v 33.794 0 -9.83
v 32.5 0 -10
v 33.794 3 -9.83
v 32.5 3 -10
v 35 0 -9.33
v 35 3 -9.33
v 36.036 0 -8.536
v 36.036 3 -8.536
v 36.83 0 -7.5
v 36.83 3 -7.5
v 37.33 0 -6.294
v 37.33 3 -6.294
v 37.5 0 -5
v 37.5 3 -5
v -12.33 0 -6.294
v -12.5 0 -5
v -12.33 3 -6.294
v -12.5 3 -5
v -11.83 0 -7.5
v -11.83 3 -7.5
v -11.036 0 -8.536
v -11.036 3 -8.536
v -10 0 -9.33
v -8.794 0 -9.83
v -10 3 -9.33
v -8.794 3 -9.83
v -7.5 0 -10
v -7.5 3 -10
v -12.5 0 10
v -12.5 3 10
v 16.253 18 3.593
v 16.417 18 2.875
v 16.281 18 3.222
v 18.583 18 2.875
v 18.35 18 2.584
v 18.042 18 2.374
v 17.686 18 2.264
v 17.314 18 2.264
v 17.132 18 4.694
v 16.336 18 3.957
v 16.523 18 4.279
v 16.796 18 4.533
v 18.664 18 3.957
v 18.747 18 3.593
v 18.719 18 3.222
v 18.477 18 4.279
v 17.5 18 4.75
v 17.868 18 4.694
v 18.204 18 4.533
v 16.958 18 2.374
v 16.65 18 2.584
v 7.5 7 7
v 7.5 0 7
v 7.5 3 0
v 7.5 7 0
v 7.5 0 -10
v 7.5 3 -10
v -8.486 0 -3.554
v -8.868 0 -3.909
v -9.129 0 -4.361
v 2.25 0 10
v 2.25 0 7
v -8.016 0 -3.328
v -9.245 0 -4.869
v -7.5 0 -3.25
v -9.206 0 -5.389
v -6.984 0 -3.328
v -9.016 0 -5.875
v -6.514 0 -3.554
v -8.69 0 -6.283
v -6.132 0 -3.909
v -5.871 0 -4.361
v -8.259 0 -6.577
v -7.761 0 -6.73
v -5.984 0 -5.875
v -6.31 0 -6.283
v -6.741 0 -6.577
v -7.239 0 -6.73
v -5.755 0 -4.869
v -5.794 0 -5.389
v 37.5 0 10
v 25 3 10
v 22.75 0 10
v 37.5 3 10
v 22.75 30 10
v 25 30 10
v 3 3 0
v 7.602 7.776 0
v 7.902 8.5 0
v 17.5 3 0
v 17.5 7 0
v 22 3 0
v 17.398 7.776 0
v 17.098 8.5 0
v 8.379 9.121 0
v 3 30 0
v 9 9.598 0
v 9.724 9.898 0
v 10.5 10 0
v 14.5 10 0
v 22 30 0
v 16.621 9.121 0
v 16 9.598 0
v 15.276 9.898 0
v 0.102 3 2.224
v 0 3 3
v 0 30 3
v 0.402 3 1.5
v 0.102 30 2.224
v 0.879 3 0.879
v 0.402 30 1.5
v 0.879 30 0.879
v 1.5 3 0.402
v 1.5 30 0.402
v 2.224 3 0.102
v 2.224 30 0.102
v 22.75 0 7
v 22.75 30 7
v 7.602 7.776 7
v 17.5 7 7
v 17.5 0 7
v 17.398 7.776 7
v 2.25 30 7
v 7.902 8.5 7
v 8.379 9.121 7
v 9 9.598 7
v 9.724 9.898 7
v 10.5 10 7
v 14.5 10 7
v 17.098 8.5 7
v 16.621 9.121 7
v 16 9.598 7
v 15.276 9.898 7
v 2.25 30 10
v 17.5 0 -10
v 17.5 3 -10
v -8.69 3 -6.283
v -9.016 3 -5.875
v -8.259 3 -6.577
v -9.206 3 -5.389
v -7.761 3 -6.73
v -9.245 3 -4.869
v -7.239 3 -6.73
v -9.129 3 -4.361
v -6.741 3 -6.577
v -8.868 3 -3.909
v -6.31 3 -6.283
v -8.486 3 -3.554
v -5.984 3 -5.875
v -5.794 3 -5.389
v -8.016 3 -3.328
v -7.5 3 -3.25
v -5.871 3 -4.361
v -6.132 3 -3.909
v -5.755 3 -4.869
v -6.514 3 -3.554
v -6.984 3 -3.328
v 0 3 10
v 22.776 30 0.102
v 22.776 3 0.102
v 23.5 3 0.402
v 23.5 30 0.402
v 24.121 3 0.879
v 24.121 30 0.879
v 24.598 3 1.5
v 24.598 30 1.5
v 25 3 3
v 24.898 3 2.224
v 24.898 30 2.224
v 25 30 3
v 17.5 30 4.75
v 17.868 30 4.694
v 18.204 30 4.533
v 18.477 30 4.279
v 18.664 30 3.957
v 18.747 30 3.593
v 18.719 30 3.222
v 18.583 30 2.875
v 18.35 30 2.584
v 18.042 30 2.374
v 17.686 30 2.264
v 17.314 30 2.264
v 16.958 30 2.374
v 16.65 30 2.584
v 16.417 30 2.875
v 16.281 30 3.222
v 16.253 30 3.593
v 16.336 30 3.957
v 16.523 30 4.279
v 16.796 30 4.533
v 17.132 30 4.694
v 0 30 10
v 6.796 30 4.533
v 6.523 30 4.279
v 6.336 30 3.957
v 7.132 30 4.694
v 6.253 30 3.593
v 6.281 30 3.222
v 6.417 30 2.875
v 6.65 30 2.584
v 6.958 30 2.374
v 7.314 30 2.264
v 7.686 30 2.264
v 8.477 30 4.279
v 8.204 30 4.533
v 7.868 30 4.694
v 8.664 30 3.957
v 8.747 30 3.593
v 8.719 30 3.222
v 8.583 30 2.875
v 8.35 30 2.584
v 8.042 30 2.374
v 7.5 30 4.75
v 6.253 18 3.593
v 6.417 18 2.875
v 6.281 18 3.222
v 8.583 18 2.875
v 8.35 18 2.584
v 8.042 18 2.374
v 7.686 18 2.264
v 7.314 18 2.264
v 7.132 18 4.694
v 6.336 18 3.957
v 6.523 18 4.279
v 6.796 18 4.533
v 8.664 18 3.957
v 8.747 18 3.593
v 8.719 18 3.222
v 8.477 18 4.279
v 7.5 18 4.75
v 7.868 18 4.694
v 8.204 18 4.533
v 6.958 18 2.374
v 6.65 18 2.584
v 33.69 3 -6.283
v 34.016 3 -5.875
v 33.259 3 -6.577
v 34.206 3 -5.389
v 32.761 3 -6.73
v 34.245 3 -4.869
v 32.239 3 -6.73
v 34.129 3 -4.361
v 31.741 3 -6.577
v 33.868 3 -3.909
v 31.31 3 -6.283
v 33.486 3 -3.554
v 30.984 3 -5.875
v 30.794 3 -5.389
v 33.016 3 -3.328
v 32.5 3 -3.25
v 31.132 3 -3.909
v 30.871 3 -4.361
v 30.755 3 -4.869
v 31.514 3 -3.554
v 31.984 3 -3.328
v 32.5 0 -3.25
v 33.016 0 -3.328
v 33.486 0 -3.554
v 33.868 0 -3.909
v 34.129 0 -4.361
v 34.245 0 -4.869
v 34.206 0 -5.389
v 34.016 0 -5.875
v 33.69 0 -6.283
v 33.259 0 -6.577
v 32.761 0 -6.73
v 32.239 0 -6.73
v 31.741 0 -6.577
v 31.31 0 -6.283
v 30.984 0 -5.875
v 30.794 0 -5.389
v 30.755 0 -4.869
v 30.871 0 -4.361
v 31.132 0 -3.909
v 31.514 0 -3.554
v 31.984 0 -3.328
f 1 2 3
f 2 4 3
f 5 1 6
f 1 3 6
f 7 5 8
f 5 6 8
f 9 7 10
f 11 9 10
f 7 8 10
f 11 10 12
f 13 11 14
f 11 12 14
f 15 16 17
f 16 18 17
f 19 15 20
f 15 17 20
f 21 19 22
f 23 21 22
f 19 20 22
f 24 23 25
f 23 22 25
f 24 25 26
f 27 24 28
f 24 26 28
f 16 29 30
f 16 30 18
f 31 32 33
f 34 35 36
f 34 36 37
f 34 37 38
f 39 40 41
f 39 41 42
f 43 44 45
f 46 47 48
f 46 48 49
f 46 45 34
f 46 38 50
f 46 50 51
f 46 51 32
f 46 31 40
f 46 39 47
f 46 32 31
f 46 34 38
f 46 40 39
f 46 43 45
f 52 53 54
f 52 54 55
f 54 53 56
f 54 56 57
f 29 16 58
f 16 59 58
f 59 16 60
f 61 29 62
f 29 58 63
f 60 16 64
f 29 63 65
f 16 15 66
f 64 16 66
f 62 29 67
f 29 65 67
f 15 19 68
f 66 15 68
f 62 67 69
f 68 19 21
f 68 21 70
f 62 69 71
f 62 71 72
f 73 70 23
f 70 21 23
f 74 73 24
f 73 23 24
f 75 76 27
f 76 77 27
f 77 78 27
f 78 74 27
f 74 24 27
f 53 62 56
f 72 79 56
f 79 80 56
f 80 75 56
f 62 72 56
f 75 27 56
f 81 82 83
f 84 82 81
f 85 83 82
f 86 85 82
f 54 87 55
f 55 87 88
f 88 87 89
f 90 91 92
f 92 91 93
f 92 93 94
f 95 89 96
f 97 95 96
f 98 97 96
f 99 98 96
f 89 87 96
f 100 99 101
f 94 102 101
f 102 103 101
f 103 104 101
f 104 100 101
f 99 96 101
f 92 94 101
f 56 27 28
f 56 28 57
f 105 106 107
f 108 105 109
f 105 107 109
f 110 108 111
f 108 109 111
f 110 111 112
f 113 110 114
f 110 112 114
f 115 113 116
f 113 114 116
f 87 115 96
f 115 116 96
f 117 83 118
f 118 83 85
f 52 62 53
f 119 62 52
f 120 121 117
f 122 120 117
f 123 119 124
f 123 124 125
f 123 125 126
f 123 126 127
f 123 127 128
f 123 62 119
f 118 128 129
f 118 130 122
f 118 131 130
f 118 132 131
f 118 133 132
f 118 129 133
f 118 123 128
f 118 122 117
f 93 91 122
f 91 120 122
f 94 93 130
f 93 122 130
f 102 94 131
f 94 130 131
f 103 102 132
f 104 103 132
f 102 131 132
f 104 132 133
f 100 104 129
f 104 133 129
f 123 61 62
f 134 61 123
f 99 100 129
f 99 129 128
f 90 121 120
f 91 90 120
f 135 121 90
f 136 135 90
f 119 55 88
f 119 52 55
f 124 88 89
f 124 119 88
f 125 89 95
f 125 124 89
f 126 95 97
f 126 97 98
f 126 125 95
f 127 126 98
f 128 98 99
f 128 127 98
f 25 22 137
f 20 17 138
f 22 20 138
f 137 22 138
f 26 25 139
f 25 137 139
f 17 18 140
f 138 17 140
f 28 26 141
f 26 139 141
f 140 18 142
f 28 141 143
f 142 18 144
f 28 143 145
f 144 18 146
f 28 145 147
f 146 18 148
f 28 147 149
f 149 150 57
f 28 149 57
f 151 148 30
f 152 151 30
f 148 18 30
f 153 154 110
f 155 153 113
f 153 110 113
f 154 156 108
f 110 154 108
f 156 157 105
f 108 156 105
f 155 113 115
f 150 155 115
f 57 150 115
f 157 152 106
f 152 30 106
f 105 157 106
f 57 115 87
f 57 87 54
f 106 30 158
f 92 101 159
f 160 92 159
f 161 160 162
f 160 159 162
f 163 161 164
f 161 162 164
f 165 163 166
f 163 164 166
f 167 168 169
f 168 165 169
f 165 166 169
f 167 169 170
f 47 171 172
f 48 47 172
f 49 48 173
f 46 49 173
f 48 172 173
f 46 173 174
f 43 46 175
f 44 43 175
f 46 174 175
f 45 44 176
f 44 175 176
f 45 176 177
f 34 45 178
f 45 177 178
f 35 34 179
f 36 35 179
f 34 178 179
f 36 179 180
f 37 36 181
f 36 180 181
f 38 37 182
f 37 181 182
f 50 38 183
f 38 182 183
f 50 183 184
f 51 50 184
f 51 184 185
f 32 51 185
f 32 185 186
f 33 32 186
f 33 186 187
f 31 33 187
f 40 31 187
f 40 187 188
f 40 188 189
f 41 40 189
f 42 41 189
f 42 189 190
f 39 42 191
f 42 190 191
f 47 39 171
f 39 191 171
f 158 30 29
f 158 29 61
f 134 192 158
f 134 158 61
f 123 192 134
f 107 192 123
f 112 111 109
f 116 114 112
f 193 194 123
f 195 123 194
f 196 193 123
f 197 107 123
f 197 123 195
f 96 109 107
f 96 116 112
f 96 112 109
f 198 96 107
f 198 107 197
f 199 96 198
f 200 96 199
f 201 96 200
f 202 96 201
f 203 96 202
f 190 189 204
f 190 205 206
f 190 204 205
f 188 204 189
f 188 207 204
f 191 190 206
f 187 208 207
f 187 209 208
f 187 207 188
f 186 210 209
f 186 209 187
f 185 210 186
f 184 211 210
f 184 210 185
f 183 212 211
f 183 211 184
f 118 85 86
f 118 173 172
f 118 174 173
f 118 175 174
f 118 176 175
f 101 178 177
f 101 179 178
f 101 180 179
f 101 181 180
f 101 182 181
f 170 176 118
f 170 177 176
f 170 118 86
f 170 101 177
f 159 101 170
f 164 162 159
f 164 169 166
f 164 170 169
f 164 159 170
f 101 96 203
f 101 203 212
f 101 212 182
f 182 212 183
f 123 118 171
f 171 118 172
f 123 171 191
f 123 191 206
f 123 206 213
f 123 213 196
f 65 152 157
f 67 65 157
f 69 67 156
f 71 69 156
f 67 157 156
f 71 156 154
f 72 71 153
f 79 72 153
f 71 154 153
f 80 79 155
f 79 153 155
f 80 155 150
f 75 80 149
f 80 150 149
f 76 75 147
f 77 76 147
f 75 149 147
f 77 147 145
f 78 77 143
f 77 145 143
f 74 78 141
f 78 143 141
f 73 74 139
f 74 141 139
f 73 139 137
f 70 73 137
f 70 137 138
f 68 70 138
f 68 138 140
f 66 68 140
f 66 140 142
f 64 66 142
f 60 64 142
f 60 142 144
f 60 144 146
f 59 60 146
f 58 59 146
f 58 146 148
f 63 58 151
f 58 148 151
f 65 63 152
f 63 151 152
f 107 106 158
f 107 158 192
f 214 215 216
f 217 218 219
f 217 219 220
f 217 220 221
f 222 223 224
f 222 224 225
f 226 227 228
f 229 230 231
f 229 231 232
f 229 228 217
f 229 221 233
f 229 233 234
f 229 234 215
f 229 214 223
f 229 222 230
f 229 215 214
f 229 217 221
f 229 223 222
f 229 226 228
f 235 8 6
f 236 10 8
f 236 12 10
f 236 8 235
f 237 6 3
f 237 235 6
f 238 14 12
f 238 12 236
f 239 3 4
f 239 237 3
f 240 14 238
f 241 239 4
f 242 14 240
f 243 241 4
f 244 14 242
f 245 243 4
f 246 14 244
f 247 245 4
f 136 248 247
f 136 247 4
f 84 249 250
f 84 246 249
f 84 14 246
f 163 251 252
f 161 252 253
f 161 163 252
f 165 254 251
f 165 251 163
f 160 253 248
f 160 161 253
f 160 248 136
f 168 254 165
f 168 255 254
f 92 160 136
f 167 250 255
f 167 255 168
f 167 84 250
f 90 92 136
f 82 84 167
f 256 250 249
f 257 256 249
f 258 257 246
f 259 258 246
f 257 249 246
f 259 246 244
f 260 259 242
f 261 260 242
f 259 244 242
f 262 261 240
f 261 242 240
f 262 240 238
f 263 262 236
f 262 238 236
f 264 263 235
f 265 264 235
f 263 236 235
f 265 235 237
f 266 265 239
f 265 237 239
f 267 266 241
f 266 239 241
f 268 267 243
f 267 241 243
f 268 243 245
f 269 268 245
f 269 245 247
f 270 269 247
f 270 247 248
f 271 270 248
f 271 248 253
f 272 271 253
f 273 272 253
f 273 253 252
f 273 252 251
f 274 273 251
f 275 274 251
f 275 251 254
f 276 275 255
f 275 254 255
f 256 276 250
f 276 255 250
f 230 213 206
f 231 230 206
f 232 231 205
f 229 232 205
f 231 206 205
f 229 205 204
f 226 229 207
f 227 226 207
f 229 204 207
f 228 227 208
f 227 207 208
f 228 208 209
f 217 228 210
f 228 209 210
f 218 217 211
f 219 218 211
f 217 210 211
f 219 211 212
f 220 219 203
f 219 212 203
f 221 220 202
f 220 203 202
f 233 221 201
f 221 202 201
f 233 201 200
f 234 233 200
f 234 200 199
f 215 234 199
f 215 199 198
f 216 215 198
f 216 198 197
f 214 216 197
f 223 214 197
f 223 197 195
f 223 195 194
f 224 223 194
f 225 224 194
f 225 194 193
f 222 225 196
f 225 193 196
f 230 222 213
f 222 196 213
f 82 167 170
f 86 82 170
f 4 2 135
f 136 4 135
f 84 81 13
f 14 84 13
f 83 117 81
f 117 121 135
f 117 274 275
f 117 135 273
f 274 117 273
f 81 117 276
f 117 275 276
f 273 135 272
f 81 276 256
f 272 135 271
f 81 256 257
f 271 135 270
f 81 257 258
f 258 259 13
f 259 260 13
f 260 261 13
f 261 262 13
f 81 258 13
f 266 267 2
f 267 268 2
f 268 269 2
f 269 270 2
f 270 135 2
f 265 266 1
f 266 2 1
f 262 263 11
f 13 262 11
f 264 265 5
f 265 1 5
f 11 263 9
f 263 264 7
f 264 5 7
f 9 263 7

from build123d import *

# Parameters (mm, degrees)
SKETCH_1_W          = 25
SKETCH_1_H          = 30
EXTRUDE_1_DEPTH     = 10
SKETCH_2_W          = 20.5
SKETCH_2_H          = 30
CUT_EXTRUDE_1_DEPTH = 3
SKETCH_3_R          = 1.25
CUT_EXTRUDE_2_DEPTH = 12
SKETCH_5_W          = 10
SKETCH_5_H          = 10
CUT_EXTRUDE_4_DEPTH = 12
FILLET_1_R          = 3
EXTRUDE_2_DEPTH     = 3
FILLET_2_R          = 5
SKETCH_7_R          = 1.75
CUT_EXTRUDE_5_DEPTH = 3


with BuildPart() as part:
    # 스케치1 → 보스-돌출1 (new body)
    with BuildSketch(Plane.XY):
        with Locations((12.5, 15)):
            Rectangle(SKETCH_1_W, SKETCH_1_H)
    extrude(amount=EXTRUDE_1_DEPTH)

    # 스케치2 → 컷-돌출1 (cut)
    with BuildSketch(Plane.XY.offset(10)):
        with Locations((12.5, 15)):
            Rectangle(SKETCH_2_W, SKETCH_2_H)
    extrude(amount=-CUT_EXTRUDE_1_DEPTH, mode=Mode.SUBTRACT)

    # 스케치3 → 컷-돌출2 (cut)
    with BuildSketch(Plane(origin=(0, 30, 0), x_dir=(1, 0, 0), z_dir=(0, 1, 0))):
        with Locations(Location((7.5, -3.5, 0), (0, 0, 270))):
            Circle(SKETCH_3_R)
        with Locations(Location((17.5, -3.5, 0), (0, 0, 270))):
            Circle(SKETCH_3_R)
    extrude(amount=-CUT_EXTRUDE_2_DEPTH, mode=Mode.SUBTRACT)

    # 스케치5 → 컷-돌출4 (cut)
    with BuildSketch(Plane(origin=(0, 0, 0), x_dir=(-1, 0, 0), z_dir=(0, 0, -1))):
        with Locations((-12.5, 5)):
            Rectangle(SKETCH_5_W, SKETCH_5_H)
    extrude(amount=-CUT_EXTRUDE_4_DEPTH, mode=Mode.SUBTRACT)

    # 필렛1
    fillet_1_edges = [part.edges().sort_by_distance(p)[0] for p in [
        (17.5, 10, 3.5),
        (7.5, 10, 3.5),
        (25, 15, 0),
        (0, 15, 0),
    ]]
    fillet(fillet_1_edges, radius=FILLET_1_R)

    # 스케치6 → 보스-돌출2 (add)
    with BuildSketch(Plane.XZ):
        Polygon((22.75, 10), (37.5, 10), (37.5, -10), (17.5, -10), (17.5, 7), (22.75, 7), align=None)
        with BuildLine():
            Line((7.5, -10), (7.5, 0))
            Line((7.5, 0), (3, 0))
            ThreePointArc((3, 0), (0.878679656, 0.878679656), (0, 3))
            Line((0, 3), (0, 10))
            Line((0, 10), (-12.5, 10))
            Line((-12.5, 10), (-12.5, -10))
            Line((-12.5, -10), (-3.976787784, -10))
            Line((-3.976787784, -10), (7.5, -10))
        make_face()
    extrude(amount=-EXTRUDE_2_DEPTH)

    # 필렛2
    fillet_2_edges = [part.edges().sort_by_distance(p)[0] for p in [
        (-12.5, 1.5, -10),
        (37.5, 1.5, -10),
    ]]
    fillet(fillet_2_edges, radius=FILLET_2_R)

    # 스케치7 → 컷-돌출5 (cut)
    with BuildSketch(Plane(origin=(0, 3, 0), x_dir=(1, 0, 0), z_dir=(0, 1, 0))):
        with Locations(Location((32.5, 5, 0), (0, 0, 270))):
            Circle(SKETCH_7_R)
        with Locations(Location((-7.5, 5, 0), (0, 0, 270))):
            Circle(SKETCH_7_R)
    extrude(amount=-CUT_EXTRUDE_5_DEPTH, mode=Mode.SUBTRACT)


solid = part.part
